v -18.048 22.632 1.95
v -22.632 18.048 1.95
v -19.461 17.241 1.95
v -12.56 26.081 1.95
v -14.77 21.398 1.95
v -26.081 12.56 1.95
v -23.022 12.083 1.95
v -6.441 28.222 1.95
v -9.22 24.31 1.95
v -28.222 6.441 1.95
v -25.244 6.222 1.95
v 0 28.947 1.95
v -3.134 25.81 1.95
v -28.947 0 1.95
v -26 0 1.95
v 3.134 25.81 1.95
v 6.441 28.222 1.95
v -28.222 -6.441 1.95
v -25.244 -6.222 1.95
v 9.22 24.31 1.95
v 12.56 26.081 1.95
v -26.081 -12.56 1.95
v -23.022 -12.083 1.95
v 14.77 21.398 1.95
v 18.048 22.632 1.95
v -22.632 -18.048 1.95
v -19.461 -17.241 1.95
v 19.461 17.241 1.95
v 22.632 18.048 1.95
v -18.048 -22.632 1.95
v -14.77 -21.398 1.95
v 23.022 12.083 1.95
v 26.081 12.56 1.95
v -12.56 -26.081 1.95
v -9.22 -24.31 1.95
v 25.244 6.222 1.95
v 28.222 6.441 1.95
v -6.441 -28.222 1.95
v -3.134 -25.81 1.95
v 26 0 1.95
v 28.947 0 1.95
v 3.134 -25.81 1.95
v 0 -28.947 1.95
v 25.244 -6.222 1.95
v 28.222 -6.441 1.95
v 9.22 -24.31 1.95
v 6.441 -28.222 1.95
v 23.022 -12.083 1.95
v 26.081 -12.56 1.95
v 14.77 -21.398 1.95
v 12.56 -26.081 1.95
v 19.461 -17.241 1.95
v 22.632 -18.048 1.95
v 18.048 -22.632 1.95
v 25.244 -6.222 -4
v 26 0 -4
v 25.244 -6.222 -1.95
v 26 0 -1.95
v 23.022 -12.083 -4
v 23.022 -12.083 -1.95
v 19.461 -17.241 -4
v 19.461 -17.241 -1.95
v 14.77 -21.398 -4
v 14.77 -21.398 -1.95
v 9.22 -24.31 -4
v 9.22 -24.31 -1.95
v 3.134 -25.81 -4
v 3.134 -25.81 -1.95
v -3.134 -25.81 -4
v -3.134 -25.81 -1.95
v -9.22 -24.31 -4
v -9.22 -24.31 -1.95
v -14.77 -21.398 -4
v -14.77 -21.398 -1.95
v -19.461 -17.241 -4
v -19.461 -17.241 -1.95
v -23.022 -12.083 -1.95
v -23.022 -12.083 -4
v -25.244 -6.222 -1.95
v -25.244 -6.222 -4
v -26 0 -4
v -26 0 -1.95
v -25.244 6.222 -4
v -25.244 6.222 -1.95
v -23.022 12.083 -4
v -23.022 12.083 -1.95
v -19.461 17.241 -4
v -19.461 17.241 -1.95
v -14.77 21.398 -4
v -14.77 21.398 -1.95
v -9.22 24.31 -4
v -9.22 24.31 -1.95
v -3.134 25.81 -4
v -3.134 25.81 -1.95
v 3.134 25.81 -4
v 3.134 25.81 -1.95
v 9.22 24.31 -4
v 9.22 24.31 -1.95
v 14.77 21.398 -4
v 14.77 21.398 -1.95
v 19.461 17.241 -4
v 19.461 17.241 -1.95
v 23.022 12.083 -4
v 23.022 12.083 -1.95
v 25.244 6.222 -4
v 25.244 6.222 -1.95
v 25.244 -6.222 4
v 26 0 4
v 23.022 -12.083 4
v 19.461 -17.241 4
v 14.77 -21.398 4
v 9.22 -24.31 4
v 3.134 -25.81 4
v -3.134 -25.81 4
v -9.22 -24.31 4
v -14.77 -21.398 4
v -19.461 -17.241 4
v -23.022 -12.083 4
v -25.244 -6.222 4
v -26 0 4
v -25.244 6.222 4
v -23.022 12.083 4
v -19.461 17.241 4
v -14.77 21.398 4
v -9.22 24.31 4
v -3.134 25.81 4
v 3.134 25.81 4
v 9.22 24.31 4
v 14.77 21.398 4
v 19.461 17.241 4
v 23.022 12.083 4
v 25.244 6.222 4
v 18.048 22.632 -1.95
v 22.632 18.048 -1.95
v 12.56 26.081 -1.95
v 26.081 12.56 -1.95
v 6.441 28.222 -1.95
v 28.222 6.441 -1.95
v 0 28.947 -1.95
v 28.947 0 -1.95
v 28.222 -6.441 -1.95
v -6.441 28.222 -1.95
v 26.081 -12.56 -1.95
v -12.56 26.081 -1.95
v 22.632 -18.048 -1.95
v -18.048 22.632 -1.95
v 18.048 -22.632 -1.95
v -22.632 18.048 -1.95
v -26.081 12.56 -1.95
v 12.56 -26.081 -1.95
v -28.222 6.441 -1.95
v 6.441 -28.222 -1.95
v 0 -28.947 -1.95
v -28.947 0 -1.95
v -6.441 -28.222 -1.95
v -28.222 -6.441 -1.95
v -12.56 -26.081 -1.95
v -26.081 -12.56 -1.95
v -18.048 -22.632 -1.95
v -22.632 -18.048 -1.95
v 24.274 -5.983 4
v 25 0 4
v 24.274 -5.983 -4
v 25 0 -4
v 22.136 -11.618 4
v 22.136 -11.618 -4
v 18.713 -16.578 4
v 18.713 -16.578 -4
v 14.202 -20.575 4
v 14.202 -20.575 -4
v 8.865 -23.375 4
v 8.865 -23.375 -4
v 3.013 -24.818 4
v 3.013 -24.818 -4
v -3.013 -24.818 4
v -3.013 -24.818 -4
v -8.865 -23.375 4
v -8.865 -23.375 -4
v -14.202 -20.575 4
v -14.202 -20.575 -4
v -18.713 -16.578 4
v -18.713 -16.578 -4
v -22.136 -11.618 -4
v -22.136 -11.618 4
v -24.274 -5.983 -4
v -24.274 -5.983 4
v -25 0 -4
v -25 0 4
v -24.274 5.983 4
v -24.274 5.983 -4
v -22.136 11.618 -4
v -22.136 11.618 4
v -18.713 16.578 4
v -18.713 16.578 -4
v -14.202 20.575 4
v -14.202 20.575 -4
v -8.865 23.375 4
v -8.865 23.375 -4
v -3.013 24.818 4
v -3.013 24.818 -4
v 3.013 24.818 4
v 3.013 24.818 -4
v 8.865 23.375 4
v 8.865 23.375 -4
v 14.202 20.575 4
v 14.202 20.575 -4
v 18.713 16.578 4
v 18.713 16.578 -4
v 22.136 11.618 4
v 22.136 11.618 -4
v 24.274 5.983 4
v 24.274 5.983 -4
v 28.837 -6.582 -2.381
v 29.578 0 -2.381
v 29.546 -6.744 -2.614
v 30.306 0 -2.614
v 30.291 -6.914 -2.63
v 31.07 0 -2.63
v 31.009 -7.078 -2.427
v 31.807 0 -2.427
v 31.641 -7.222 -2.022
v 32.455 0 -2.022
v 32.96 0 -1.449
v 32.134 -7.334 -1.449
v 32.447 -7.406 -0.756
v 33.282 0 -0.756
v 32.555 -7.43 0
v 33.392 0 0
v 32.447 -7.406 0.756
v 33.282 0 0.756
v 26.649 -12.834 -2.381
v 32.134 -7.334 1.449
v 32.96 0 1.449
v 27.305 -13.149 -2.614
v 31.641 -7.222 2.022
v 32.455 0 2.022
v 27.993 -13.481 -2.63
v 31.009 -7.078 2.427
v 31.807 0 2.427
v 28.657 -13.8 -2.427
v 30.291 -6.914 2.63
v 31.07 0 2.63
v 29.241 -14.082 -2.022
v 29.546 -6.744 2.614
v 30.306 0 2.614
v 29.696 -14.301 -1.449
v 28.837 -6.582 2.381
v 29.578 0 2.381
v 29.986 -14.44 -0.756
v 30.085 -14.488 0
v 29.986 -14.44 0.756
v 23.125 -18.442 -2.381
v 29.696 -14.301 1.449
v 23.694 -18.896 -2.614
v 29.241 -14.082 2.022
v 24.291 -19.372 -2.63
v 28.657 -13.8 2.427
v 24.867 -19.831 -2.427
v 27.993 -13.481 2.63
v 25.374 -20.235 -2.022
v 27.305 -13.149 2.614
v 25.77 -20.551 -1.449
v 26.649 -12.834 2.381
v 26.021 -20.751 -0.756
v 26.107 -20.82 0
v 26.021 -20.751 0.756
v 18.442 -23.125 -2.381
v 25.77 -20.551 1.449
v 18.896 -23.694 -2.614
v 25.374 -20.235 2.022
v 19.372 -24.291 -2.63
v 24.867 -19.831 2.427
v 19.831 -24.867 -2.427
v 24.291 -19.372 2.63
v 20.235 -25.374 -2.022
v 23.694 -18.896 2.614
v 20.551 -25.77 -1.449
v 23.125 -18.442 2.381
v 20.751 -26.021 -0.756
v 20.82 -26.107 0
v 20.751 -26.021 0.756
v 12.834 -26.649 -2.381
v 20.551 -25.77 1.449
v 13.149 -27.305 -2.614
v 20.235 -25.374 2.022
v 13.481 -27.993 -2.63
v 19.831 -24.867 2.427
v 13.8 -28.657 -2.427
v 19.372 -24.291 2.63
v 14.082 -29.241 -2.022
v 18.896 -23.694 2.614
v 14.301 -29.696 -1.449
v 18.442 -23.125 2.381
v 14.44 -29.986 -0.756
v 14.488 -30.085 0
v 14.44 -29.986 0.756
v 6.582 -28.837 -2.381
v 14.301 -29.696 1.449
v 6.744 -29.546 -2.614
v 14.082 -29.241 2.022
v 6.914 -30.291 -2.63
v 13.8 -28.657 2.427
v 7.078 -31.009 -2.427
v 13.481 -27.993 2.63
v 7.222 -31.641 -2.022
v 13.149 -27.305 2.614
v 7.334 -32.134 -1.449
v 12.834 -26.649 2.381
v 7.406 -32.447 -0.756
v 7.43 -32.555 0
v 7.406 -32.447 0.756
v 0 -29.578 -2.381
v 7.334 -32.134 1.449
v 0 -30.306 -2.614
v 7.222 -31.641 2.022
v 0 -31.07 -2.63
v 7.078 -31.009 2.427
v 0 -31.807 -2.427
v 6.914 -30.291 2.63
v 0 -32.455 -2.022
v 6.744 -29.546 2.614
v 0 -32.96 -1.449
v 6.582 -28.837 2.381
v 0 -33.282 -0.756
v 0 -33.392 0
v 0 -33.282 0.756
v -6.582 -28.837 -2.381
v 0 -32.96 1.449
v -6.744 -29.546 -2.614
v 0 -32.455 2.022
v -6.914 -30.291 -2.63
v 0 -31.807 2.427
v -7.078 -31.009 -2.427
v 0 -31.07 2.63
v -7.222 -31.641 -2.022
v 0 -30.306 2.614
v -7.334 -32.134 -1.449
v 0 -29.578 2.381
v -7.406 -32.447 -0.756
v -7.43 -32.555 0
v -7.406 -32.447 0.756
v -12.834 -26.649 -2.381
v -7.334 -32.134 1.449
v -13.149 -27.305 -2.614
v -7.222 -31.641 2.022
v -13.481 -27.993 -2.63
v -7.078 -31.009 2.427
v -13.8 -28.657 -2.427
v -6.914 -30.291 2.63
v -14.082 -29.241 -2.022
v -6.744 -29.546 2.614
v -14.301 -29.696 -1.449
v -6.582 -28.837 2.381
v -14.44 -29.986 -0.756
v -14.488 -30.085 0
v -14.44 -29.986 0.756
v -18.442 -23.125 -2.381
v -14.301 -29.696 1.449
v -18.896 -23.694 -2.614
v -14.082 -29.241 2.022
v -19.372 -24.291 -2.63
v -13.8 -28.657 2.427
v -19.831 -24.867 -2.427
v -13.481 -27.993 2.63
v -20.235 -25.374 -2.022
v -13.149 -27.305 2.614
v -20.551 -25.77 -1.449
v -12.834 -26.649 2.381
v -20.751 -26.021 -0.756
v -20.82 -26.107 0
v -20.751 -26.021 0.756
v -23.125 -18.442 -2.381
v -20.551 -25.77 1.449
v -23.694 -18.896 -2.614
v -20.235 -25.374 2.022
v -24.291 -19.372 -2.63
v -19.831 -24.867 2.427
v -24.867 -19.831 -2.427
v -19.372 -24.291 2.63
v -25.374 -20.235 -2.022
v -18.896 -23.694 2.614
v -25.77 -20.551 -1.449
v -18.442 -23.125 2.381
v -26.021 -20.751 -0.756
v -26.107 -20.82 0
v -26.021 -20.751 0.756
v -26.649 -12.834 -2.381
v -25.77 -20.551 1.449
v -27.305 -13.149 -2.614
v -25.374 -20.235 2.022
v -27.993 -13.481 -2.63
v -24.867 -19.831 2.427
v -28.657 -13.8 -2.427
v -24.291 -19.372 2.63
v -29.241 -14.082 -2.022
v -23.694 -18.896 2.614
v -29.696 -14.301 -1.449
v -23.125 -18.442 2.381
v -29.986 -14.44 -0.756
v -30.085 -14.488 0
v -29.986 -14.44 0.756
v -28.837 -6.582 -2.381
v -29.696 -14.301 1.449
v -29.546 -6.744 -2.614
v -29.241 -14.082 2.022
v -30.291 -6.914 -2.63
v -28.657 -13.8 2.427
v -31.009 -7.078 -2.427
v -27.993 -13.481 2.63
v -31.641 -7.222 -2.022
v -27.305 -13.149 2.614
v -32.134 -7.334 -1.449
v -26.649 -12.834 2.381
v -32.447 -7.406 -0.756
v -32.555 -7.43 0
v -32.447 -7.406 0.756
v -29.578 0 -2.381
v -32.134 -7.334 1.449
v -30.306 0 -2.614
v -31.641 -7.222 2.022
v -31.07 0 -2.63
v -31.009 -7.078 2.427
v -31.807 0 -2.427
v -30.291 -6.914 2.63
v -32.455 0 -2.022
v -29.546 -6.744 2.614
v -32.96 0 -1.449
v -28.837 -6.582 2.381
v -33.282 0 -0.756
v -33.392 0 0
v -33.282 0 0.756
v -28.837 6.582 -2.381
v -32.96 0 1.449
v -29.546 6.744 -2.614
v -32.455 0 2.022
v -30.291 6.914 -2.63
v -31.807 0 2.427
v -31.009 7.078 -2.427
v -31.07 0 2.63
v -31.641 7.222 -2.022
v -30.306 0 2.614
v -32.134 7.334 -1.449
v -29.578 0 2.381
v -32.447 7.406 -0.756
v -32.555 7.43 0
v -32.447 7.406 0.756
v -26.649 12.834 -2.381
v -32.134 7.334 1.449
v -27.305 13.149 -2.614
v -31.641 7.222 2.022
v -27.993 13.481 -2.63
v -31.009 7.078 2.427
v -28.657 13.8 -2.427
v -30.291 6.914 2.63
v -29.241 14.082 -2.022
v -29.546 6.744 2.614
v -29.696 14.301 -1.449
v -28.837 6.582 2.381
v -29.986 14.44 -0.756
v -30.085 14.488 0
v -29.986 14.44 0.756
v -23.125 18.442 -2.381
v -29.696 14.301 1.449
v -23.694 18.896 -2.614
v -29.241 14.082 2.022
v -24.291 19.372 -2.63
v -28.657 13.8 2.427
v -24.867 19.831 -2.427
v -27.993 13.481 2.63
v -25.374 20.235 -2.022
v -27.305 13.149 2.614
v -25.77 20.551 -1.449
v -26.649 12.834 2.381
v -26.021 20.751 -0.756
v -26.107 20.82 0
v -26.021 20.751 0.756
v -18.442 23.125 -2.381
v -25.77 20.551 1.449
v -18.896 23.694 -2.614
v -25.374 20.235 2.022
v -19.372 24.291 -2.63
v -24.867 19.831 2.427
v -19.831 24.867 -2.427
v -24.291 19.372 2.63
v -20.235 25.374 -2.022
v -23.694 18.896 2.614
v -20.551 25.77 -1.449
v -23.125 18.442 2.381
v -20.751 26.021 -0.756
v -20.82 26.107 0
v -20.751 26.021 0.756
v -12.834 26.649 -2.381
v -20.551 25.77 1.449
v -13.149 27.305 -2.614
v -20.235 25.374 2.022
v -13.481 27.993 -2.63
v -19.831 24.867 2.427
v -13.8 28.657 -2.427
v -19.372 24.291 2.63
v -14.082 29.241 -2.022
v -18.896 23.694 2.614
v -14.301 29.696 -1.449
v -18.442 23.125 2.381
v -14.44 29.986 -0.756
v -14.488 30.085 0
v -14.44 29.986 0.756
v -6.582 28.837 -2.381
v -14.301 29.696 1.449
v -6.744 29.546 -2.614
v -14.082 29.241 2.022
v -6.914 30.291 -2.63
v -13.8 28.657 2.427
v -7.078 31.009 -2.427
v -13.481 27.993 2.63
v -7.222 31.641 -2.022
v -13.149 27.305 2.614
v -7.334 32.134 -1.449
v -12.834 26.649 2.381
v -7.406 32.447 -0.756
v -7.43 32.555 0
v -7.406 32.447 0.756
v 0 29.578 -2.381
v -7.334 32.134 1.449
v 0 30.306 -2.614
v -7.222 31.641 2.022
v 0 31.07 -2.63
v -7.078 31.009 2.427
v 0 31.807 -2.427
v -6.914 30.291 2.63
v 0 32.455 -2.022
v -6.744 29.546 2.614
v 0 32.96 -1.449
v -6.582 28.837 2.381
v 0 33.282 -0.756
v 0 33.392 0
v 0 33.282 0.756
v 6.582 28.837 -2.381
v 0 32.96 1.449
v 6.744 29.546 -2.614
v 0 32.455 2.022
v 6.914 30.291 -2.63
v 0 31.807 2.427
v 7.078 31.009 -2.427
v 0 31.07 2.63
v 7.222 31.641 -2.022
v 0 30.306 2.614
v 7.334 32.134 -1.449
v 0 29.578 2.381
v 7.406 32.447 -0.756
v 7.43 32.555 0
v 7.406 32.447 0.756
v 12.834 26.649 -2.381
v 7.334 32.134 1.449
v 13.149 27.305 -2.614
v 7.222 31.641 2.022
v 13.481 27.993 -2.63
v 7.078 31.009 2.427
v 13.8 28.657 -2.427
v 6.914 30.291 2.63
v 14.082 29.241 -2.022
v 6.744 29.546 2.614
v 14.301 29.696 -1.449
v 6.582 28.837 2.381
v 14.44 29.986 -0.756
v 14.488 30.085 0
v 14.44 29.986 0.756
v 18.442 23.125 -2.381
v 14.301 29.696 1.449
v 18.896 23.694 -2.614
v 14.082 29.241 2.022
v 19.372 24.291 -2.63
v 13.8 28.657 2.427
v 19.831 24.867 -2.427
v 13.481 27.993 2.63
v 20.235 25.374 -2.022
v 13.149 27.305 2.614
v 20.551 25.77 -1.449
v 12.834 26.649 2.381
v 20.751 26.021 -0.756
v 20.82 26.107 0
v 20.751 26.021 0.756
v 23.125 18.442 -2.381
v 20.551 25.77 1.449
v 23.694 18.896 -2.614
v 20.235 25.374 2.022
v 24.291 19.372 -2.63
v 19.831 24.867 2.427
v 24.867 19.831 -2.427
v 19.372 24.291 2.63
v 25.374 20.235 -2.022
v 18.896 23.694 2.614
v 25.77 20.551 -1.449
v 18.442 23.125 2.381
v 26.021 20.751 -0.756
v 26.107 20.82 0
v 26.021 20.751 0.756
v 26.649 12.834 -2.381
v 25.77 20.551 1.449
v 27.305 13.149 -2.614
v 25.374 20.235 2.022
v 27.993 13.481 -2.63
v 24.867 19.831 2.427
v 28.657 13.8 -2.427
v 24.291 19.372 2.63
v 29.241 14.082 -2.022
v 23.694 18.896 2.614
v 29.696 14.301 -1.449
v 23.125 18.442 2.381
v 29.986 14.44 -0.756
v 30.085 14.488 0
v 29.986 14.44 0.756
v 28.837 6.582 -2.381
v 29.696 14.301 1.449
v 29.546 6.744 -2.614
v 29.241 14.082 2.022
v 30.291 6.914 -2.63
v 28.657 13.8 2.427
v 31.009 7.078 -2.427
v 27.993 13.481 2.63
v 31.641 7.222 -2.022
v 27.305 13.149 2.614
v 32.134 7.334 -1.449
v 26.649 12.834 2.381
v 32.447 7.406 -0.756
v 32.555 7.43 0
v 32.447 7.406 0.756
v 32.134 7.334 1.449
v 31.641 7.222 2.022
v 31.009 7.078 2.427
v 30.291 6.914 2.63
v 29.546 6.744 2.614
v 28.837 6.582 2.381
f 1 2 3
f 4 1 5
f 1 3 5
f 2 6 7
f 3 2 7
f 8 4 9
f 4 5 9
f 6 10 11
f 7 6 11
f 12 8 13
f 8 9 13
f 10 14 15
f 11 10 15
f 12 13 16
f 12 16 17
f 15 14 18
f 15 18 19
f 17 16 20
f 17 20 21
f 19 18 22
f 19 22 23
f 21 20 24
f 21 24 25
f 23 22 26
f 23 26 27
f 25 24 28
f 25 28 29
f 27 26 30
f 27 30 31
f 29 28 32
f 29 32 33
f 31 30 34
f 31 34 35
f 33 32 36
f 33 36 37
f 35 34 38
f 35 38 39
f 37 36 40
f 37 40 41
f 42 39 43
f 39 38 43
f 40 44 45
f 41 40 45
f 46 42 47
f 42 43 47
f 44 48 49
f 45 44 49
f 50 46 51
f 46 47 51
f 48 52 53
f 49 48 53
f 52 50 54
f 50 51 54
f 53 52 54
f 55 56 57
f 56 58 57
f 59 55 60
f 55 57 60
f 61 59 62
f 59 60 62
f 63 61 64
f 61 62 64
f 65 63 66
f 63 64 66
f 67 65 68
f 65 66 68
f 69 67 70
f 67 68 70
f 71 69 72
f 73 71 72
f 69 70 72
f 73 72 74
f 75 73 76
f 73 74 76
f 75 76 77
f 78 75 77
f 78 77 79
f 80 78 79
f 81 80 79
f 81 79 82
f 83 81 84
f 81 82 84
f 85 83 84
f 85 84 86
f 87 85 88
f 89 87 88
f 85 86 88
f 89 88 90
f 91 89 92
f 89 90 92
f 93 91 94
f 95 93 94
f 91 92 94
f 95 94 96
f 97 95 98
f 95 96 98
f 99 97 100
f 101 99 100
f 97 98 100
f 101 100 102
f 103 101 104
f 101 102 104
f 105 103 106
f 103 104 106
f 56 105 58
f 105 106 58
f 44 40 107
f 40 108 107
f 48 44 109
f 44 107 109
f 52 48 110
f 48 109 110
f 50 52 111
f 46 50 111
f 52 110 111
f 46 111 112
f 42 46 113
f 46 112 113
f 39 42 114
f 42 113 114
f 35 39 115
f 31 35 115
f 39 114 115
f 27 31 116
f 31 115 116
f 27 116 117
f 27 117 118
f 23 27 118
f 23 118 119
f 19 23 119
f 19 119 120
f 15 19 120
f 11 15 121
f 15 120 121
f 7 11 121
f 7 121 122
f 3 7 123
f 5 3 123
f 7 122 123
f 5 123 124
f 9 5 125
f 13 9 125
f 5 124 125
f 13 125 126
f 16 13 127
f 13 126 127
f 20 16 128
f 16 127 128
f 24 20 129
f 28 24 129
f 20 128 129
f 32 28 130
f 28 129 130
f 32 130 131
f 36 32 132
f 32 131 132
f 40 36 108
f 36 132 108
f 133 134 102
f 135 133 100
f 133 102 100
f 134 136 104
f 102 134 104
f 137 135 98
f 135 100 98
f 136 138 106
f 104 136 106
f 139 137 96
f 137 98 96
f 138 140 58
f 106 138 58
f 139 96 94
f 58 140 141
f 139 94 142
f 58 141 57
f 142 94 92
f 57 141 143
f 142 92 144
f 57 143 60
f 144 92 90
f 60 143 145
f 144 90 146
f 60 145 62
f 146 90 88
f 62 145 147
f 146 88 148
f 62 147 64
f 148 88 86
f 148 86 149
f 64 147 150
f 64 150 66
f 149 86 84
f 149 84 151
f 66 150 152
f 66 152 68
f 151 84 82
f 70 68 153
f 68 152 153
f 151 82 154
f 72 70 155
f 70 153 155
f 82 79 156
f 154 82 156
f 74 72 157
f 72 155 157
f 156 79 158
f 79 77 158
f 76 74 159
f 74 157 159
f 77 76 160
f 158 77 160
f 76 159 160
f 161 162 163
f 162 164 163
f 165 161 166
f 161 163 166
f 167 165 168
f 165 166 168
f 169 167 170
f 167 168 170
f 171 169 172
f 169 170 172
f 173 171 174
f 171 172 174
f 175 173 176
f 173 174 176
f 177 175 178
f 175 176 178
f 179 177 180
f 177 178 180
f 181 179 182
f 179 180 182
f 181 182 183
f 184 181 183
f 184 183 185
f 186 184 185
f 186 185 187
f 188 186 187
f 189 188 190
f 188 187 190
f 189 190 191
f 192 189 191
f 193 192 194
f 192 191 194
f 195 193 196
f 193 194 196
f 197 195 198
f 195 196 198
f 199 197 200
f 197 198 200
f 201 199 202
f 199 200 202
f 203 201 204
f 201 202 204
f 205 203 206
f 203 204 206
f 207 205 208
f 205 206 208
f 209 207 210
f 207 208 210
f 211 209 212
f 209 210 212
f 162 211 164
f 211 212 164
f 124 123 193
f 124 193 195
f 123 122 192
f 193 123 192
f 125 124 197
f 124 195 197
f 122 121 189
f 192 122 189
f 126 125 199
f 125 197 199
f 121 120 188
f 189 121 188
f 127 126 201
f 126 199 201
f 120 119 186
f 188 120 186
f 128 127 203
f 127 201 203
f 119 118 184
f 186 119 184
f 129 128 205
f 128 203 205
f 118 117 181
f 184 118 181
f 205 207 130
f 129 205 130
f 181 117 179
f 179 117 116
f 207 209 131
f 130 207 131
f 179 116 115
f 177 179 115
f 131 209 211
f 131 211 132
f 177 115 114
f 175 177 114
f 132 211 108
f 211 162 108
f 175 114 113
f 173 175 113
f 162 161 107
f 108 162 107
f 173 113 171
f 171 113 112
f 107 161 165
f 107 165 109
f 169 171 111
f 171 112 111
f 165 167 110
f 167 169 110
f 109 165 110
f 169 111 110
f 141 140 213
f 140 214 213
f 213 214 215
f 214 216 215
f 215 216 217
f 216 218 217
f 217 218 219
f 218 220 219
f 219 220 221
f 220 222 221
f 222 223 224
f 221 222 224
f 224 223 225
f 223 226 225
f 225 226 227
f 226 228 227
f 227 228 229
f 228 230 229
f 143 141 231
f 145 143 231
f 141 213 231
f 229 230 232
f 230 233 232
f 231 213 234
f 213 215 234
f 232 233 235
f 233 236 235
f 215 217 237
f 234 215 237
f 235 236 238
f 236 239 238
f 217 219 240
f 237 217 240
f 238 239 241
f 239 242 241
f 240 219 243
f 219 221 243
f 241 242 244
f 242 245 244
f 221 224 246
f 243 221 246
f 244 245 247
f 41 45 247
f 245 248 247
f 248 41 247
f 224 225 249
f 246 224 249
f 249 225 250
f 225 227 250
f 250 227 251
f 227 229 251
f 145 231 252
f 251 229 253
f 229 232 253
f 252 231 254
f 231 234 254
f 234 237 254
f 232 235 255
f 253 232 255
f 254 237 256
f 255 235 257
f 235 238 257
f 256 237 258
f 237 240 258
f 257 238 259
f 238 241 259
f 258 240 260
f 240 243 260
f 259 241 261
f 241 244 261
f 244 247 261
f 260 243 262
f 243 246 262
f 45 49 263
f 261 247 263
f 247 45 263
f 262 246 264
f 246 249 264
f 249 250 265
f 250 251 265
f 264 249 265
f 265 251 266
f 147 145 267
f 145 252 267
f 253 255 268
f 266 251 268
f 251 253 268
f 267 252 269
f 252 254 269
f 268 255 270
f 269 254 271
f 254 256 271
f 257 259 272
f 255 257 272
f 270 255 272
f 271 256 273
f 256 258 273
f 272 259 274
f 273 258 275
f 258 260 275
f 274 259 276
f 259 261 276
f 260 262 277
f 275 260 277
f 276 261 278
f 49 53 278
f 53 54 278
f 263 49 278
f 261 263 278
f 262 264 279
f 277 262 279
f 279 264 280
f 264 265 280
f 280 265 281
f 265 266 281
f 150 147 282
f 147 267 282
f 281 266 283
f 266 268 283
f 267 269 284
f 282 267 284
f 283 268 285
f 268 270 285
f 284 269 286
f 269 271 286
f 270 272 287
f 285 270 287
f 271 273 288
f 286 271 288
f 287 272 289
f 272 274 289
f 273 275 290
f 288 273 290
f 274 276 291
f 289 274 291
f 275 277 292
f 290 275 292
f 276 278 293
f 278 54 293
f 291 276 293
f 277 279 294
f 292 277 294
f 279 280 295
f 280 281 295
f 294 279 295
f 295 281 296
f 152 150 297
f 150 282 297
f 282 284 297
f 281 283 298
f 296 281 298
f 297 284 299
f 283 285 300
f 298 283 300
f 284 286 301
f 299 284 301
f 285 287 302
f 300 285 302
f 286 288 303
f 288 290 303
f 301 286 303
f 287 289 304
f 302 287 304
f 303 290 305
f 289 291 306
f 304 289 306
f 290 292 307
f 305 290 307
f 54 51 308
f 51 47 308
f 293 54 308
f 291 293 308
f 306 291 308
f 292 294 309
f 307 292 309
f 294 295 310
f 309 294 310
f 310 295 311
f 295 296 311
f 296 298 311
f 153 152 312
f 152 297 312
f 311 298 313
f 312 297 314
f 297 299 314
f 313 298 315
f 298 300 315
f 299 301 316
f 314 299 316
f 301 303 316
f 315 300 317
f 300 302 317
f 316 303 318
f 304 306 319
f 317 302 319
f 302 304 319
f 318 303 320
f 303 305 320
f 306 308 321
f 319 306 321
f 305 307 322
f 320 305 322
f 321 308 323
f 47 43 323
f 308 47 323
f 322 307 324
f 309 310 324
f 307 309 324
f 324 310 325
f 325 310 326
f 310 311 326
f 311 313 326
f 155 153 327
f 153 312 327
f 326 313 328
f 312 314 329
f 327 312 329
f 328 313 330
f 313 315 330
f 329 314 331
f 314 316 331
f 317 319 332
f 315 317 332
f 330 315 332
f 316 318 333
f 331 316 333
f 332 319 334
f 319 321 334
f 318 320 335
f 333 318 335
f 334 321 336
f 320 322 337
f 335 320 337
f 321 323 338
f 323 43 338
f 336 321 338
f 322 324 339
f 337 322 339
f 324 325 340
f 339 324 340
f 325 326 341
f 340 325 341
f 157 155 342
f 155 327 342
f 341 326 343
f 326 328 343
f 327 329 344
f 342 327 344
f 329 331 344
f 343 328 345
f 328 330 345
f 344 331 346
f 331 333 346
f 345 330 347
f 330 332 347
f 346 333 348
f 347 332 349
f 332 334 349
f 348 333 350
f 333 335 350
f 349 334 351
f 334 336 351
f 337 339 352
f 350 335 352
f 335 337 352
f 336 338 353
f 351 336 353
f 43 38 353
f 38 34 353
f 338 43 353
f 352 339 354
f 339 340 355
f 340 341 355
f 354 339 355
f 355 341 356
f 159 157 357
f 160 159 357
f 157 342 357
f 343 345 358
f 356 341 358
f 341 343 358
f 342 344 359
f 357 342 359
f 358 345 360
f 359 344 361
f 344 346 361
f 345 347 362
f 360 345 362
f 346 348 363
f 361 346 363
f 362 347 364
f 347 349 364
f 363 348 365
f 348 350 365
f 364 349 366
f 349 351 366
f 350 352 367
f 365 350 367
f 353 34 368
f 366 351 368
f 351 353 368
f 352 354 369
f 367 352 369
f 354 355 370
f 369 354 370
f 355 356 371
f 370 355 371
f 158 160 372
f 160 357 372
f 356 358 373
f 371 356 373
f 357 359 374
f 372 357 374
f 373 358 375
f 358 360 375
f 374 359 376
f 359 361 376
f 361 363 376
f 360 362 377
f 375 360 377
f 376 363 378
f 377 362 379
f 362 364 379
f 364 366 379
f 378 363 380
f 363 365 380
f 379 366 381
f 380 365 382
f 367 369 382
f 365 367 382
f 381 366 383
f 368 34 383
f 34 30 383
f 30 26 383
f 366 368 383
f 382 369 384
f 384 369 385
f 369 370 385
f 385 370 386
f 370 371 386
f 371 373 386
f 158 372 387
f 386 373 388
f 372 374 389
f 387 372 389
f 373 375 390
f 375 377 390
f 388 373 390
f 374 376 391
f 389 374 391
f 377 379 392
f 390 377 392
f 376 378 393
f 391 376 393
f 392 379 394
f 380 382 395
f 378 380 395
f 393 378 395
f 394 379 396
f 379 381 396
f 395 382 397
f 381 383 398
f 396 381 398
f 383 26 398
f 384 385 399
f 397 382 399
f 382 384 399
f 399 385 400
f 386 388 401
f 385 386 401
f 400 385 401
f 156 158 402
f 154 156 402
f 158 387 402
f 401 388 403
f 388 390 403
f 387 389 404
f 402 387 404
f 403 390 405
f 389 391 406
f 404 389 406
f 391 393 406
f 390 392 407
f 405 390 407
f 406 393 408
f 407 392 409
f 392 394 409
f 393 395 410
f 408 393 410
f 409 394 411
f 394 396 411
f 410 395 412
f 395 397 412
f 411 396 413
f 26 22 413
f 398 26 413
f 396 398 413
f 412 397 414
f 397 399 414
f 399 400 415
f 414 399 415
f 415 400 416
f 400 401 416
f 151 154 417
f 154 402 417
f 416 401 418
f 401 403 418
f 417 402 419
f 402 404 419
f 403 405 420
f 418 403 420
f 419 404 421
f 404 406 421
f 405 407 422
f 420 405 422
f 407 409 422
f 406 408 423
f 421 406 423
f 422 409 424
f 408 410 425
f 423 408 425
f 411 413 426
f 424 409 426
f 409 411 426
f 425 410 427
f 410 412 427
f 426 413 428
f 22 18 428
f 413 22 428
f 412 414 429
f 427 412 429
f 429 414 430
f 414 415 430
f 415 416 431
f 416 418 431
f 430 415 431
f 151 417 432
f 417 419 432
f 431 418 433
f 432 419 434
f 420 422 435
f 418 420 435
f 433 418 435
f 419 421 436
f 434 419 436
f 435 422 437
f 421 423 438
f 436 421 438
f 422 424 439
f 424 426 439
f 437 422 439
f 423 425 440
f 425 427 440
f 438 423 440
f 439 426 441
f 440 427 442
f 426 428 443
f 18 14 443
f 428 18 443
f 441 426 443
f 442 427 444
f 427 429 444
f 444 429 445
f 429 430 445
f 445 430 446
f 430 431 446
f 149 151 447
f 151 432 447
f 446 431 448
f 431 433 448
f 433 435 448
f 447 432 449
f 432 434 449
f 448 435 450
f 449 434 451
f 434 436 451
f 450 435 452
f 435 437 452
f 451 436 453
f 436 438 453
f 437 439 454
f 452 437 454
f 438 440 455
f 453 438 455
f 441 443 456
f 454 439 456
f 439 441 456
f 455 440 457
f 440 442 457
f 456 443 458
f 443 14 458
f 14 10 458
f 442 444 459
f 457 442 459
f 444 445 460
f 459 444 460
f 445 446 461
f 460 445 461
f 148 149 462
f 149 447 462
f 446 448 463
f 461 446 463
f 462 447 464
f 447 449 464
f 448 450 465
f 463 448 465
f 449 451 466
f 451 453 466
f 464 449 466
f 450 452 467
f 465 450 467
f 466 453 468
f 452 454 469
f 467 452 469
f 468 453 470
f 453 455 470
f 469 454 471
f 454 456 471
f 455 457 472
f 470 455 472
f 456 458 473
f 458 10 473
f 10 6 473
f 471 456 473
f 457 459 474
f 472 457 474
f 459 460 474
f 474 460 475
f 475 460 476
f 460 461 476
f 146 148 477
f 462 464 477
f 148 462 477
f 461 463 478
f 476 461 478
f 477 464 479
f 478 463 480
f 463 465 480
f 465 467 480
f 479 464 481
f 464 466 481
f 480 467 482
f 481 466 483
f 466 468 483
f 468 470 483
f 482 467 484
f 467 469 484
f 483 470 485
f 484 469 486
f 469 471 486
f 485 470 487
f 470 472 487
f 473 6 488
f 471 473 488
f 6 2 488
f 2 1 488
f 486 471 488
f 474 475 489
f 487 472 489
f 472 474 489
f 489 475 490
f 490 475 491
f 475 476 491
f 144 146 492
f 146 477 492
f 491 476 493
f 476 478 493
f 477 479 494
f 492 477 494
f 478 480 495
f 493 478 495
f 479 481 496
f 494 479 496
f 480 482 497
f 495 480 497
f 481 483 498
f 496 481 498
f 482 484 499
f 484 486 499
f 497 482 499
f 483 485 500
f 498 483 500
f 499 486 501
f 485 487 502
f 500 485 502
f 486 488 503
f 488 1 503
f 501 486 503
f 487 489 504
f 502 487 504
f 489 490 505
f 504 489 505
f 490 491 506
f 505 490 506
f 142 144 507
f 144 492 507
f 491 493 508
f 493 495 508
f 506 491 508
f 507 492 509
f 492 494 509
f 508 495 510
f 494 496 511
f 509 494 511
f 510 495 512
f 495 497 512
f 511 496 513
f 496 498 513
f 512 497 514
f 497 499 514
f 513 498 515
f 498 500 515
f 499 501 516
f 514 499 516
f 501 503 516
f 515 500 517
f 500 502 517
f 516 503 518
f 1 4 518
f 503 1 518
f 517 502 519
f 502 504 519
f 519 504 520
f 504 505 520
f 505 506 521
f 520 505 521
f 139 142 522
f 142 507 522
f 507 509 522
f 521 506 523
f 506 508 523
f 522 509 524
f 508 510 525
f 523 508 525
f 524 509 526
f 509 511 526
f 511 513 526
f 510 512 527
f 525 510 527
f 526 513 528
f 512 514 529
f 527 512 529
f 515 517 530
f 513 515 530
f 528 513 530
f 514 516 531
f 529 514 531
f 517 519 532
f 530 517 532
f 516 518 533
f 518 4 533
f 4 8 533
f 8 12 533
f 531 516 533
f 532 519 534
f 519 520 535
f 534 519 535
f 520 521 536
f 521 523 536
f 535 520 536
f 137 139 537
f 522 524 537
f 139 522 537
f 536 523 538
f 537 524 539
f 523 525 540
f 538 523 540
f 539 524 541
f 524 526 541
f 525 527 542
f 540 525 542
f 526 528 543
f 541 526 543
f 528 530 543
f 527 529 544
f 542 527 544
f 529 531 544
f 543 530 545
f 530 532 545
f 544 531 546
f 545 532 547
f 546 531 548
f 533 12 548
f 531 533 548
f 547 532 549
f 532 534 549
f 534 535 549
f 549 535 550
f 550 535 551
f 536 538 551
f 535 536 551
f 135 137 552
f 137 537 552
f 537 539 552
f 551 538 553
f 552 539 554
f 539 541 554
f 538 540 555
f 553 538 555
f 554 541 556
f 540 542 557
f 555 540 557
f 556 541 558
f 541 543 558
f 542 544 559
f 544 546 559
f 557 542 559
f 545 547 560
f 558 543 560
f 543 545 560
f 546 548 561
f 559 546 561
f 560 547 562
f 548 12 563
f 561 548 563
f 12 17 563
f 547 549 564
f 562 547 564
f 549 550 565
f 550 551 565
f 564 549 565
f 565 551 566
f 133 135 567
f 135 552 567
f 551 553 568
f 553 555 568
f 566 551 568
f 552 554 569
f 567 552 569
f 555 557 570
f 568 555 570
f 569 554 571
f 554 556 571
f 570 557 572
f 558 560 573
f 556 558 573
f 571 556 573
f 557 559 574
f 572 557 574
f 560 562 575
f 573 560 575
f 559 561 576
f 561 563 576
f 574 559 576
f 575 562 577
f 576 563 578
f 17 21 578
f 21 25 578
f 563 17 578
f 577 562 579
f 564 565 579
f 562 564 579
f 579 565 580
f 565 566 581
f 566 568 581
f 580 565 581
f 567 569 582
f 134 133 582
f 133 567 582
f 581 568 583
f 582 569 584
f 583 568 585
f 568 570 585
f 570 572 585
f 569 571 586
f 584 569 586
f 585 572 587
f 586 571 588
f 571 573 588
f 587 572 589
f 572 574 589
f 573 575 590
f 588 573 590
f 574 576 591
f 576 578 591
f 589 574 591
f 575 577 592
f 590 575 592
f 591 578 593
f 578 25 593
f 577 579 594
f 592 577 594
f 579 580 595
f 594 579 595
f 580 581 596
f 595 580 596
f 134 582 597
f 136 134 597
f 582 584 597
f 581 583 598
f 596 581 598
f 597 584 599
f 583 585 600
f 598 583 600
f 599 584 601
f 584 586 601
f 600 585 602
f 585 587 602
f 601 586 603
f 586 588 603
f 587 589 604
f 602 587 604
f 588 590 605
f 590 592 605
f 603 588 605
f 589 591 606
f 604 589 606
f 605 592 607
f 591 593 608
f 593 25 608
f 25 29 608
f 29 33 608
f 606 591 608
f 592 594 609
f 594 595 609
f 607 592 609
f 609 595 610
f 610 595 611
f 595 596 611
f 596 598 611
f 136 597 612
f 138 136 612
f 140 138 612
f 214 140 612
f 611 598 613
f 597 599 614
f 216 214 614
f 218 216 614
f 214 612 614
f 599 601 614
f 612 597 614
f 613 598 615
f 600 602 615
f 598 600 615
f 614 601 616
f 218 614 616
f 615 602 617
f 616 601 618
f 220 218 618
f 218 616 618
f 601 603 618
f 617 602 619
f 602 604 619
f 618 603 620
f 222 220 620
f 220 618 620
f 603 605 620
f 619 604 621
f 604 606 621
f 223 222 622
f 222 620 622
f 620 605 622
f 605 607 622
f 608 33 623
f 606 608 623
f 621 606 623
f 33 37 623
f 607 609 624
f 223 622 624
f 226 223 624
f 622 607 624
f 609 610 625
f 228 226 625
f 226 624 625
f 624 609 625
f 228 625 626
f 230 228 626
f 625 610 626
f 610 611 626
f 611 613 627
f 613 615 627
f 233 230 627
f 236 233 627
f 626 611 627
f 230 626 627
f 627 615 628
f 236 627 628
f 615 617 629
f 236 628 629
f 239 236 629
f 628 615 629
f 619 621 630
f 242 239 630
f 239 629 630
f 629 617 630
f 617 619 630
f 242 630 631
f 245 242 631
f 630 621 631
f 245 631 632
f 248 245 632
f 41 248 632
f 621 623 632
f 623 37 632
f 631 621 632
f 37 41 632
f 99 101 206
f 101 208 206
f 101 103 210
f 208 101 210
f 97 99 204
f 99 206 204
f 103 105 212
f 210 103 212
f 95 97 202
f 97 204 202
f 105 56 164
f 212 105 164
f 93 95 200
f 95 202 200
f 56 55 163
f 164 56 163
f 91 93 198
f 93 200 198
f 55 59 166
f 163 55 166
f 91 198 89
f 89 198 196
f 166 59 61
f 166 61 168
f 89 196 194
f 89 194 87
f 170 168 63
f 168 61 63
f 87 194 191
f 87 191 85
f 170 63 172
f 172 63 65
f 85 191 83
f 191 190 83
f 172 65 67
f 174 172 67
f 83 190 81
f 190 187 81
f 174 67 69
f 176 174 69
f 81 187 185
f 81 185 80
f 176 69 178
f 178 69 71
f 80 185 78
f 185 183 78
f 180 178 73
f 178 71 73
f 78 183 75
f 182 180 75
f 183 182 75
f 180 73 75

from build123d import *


with BuildPart() as part:
    # Sketch1 → Revolve1 (revolve)
    with BuildSketch(Plane(origin=(0, 0, 0), x_dir=(0, 0, -1), z_dir=(1, 0, 0)), mode=Mode.PRIVATE) as revolve1_sk:
        with BuildLine():
            Line((-4, 25), (4, 25))
            Line((4, 25), (4, 26))
            Line((4, 26), (1.95, 26))
            Line((1.95, 26), (1.95, 28.94745668))
            ThreePointArc((1.95, 28.94745668), (0, 33.391892525), (-1.95, 28.94745668))
            Line((-1.95, 28.94745668), (-1.95, 26))
            Line((-1.95, 26), (-4, 26))
            Line((-4, 26), (-4, 25))
        make_face()
    revolve(revolve1_sk.sketch.rotate(Axis((0, 0, -6.803273839), (0, 0, -1)), 90), axis=Axis((0, 0, -6.803273839), (0, 0, -1)))


solid = part.part
